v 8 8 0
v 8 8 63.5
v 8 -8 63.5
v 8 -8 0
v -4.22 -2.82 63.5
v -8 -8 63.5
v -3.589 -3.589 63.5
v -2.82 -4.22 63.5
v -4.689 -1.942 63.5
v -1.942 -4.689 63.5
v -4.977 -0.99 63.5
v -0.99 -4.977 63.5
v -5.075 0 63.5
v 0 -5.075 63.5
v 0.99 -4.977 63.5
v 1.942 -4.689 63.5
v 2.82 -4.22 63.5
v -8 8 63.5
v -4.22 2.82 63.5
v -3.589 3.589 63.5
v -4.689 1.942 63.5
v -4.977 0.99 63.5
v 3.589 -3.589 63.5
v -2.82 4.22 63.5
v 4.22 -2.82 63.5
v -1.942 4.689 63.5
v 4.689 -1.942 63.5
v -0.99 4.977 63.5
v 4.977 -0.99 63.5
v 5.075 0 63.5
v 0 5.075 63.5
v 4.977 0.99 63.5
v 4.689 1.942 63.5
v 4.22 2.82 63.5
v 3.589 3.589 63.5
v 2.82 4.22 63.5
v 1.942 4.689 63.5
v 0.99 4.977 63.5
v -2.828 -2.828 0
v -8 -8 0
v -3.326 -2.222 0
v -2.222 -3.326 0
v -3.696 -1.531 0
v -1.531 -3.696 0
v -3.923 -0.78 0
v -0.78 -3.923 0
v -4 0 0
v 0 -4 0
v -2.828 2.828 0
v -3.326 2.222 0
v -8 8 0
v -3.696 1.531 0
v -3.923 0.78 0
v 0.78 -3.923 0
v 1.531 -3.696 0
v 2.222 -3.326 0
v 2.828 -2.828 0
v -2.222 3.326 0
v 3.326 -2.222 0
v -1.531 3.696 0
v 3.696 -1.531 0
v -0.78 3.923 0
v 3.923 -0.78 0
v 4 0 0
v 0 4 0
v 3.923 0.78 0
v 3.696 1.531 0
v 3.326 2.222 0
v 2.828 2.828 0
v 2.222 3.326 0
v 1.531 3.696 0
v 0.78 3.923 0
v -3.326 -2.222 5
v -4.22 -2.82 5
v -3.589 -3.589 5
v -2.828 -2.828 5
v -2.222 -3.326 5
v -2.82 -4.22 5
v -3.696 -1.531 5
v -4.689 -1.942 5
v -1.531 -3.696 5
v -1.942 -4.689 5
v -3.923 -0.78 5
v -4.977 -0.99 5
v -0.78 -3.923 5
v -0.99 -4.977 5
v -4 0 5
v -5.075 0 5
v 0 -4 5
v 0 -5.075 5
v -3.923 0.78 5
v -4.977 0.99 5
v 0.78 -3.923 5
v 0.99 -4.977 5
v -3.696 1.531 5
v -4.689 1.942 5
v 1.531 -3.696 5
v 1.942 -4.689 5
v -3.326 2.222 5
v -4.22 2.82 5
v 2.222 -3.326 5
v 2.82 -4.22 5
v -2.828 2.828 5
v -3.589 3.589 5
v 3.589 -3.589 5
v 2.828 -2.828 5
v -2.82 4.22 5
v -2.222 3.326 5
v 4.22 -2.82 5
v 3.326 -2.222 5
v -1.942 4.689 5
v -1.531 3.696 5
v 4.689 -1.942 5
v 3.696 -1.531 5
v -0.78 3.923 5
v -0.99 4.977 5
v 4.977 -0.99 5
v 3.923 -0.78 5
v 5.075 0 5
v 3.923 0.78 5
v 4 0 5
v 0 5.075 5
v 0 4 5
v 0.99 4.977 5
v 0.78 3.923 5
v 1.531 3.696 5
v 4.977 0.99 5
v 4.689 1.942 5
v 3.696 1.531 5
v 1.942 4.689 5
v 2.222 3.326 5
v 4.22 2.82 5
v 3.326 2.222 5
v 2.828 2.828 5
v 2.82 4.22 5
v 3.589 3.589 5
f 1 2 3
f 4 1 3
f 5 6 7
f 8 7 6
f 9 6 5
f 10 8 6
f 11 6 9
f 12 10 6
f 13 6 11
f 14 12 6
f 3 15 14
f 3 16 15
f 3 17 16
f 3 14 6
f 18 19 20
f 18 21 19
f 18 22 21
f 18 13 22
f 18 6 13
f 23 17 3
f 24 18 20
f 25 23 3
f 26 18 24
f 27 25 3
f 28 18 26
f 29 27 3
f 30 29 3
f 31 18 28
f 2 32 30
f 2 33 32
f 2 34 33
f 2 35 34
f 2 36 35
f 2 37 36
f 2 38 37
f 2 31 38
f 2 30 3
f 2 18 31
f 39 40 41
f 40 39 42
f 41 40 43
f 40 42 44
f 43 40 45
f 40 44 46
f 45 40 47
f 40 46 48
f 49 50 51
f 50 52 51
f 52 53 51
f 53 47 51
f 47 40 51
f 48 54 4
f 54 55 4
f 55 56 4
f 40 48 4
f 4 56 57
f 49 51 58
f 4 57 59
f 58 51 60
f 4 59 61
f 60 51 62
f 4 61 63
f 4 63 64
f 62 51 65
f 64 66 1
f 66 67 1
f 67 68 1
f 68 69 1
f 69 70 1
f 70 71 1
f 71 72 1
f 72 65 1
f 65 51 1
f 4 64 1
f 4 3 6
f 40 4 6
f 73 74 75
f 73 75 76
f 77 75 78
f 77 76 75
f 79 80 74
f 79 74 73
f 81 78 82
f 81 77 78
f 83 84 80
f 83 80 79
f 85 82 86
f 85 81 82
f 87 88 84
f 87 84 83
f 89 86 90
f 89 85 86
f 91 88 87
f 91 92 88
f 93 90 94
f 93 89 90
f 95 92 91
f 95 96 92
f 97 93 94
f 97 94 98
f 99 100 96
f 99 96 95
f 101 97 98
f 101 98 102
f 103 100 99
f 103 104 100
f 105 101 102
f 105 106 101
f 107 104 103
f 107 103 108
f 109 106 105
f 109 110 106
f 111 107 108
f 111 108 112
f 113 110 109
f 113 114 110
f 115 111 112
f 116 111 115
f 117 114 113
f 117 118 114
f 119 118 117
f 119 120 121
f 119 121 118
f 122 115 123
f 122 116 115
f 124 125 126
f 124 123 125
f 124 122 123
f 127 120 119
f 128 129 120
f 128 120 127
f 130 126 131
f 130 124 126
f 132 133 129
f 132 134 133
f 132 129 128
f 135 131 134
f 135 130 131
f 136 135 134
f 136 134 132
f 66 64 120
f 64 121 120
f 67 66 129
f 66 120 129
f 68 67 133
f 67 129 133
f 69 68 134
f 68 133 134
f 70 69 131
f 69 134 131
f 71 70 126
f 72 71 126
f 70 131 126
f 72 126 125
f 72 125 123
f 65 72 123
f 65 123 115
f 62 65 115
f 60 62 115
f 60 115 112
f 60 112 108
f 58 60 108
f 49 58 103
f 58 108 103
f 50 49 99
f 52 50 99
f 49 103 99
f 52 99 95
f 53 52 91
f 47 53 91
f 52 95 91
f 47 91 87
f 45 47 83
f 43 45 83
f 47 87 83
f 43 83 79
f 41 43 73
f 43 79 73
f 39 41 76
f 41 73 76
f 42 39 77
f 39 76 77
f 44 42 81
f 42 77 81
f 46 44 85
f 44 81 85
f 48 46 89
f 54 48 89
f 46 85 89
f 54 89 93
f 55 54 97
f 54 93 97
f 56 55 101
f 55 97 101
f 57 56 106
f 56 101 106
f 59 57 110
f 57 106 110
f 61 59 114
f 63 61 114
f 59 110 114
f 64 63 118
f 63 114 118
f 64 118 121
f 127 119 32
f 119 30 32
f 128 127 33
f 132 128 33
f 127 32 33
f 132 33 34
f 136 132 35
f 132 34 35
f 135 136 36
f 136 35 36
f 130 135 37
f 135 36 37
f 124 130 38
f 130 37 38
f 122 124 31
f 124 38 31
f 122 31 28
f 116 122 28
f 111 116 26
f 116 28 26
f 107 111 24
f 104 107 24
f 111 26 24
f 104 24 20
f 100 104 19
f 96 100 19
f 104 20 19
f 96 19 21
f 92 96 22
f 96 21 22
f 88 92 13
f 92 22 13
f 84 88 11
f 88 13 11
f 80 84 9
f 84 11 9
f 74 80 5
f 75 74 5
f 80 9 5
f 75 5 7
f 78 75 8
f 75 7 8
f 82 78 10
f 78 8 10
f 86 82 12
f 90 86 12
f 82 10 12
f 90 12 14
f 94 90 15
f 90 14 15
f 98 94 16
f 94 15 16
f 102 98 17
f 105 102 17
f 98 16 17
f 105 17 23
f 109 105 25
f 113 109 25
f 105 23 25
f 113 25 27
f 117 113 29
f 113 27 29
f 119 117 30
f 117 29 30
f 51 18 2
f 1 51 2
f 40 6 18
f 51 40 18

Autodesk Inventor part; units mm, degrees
ref_plane "YZ Plane" through (0, 0, 0) normal (1, 0, 0) x (0, 1, 0)
ref_plane "XZ Plane" through (0, 0, 0) normal (0, 1, 0) x (-1, 0, 0)
ref_plane "XY Plane" through (0, 0, 0) normal (0, 0, 1) x (1, 0, 0)
sketch "Sketch1" plane through (0, 0, 0) normal (0, 0, 1) x (1, 0, 0)
  line L0 (-8, 8) -> (8, 8)
  line L1 (8, 8) -> (8, -8)
  line L2 (8, -8) -> (-8, -8)
  line L3 (-8, -8) -> (-8, 8)
  line L4 (-8, 8) -> (8, -8) construction
  line L5 (8, 8) -> (-8, -8) construction
  point P0 (0, 0)
  dimension "d0" = 16
  dimension "d1" = 16
extrude "Extrusion1" add sketch "Sketch1" along normal blind 63.5
sketch "Sketch2" plane through (0, 0, 63.5) normal (0, 0, 1) x (1, 0, 0)
  circle A0 centre (0, 0) radius 5.075
  dimension "d4" = 10.15
extrude "Extrusion2" cut sketch "Sketch2" against normal blind 58.5
sketch "Sketch3" plane through (0, 0, 5) normal (0, 0, 1) x (1, 0, 0)
  circle A0 centre (0, 0) radius 4
  dimension "d7" = 8
extrude "Extrusion3" cut sketch "Sketch3" against normal up to surface (5 mm away)
properties part number "holder"
